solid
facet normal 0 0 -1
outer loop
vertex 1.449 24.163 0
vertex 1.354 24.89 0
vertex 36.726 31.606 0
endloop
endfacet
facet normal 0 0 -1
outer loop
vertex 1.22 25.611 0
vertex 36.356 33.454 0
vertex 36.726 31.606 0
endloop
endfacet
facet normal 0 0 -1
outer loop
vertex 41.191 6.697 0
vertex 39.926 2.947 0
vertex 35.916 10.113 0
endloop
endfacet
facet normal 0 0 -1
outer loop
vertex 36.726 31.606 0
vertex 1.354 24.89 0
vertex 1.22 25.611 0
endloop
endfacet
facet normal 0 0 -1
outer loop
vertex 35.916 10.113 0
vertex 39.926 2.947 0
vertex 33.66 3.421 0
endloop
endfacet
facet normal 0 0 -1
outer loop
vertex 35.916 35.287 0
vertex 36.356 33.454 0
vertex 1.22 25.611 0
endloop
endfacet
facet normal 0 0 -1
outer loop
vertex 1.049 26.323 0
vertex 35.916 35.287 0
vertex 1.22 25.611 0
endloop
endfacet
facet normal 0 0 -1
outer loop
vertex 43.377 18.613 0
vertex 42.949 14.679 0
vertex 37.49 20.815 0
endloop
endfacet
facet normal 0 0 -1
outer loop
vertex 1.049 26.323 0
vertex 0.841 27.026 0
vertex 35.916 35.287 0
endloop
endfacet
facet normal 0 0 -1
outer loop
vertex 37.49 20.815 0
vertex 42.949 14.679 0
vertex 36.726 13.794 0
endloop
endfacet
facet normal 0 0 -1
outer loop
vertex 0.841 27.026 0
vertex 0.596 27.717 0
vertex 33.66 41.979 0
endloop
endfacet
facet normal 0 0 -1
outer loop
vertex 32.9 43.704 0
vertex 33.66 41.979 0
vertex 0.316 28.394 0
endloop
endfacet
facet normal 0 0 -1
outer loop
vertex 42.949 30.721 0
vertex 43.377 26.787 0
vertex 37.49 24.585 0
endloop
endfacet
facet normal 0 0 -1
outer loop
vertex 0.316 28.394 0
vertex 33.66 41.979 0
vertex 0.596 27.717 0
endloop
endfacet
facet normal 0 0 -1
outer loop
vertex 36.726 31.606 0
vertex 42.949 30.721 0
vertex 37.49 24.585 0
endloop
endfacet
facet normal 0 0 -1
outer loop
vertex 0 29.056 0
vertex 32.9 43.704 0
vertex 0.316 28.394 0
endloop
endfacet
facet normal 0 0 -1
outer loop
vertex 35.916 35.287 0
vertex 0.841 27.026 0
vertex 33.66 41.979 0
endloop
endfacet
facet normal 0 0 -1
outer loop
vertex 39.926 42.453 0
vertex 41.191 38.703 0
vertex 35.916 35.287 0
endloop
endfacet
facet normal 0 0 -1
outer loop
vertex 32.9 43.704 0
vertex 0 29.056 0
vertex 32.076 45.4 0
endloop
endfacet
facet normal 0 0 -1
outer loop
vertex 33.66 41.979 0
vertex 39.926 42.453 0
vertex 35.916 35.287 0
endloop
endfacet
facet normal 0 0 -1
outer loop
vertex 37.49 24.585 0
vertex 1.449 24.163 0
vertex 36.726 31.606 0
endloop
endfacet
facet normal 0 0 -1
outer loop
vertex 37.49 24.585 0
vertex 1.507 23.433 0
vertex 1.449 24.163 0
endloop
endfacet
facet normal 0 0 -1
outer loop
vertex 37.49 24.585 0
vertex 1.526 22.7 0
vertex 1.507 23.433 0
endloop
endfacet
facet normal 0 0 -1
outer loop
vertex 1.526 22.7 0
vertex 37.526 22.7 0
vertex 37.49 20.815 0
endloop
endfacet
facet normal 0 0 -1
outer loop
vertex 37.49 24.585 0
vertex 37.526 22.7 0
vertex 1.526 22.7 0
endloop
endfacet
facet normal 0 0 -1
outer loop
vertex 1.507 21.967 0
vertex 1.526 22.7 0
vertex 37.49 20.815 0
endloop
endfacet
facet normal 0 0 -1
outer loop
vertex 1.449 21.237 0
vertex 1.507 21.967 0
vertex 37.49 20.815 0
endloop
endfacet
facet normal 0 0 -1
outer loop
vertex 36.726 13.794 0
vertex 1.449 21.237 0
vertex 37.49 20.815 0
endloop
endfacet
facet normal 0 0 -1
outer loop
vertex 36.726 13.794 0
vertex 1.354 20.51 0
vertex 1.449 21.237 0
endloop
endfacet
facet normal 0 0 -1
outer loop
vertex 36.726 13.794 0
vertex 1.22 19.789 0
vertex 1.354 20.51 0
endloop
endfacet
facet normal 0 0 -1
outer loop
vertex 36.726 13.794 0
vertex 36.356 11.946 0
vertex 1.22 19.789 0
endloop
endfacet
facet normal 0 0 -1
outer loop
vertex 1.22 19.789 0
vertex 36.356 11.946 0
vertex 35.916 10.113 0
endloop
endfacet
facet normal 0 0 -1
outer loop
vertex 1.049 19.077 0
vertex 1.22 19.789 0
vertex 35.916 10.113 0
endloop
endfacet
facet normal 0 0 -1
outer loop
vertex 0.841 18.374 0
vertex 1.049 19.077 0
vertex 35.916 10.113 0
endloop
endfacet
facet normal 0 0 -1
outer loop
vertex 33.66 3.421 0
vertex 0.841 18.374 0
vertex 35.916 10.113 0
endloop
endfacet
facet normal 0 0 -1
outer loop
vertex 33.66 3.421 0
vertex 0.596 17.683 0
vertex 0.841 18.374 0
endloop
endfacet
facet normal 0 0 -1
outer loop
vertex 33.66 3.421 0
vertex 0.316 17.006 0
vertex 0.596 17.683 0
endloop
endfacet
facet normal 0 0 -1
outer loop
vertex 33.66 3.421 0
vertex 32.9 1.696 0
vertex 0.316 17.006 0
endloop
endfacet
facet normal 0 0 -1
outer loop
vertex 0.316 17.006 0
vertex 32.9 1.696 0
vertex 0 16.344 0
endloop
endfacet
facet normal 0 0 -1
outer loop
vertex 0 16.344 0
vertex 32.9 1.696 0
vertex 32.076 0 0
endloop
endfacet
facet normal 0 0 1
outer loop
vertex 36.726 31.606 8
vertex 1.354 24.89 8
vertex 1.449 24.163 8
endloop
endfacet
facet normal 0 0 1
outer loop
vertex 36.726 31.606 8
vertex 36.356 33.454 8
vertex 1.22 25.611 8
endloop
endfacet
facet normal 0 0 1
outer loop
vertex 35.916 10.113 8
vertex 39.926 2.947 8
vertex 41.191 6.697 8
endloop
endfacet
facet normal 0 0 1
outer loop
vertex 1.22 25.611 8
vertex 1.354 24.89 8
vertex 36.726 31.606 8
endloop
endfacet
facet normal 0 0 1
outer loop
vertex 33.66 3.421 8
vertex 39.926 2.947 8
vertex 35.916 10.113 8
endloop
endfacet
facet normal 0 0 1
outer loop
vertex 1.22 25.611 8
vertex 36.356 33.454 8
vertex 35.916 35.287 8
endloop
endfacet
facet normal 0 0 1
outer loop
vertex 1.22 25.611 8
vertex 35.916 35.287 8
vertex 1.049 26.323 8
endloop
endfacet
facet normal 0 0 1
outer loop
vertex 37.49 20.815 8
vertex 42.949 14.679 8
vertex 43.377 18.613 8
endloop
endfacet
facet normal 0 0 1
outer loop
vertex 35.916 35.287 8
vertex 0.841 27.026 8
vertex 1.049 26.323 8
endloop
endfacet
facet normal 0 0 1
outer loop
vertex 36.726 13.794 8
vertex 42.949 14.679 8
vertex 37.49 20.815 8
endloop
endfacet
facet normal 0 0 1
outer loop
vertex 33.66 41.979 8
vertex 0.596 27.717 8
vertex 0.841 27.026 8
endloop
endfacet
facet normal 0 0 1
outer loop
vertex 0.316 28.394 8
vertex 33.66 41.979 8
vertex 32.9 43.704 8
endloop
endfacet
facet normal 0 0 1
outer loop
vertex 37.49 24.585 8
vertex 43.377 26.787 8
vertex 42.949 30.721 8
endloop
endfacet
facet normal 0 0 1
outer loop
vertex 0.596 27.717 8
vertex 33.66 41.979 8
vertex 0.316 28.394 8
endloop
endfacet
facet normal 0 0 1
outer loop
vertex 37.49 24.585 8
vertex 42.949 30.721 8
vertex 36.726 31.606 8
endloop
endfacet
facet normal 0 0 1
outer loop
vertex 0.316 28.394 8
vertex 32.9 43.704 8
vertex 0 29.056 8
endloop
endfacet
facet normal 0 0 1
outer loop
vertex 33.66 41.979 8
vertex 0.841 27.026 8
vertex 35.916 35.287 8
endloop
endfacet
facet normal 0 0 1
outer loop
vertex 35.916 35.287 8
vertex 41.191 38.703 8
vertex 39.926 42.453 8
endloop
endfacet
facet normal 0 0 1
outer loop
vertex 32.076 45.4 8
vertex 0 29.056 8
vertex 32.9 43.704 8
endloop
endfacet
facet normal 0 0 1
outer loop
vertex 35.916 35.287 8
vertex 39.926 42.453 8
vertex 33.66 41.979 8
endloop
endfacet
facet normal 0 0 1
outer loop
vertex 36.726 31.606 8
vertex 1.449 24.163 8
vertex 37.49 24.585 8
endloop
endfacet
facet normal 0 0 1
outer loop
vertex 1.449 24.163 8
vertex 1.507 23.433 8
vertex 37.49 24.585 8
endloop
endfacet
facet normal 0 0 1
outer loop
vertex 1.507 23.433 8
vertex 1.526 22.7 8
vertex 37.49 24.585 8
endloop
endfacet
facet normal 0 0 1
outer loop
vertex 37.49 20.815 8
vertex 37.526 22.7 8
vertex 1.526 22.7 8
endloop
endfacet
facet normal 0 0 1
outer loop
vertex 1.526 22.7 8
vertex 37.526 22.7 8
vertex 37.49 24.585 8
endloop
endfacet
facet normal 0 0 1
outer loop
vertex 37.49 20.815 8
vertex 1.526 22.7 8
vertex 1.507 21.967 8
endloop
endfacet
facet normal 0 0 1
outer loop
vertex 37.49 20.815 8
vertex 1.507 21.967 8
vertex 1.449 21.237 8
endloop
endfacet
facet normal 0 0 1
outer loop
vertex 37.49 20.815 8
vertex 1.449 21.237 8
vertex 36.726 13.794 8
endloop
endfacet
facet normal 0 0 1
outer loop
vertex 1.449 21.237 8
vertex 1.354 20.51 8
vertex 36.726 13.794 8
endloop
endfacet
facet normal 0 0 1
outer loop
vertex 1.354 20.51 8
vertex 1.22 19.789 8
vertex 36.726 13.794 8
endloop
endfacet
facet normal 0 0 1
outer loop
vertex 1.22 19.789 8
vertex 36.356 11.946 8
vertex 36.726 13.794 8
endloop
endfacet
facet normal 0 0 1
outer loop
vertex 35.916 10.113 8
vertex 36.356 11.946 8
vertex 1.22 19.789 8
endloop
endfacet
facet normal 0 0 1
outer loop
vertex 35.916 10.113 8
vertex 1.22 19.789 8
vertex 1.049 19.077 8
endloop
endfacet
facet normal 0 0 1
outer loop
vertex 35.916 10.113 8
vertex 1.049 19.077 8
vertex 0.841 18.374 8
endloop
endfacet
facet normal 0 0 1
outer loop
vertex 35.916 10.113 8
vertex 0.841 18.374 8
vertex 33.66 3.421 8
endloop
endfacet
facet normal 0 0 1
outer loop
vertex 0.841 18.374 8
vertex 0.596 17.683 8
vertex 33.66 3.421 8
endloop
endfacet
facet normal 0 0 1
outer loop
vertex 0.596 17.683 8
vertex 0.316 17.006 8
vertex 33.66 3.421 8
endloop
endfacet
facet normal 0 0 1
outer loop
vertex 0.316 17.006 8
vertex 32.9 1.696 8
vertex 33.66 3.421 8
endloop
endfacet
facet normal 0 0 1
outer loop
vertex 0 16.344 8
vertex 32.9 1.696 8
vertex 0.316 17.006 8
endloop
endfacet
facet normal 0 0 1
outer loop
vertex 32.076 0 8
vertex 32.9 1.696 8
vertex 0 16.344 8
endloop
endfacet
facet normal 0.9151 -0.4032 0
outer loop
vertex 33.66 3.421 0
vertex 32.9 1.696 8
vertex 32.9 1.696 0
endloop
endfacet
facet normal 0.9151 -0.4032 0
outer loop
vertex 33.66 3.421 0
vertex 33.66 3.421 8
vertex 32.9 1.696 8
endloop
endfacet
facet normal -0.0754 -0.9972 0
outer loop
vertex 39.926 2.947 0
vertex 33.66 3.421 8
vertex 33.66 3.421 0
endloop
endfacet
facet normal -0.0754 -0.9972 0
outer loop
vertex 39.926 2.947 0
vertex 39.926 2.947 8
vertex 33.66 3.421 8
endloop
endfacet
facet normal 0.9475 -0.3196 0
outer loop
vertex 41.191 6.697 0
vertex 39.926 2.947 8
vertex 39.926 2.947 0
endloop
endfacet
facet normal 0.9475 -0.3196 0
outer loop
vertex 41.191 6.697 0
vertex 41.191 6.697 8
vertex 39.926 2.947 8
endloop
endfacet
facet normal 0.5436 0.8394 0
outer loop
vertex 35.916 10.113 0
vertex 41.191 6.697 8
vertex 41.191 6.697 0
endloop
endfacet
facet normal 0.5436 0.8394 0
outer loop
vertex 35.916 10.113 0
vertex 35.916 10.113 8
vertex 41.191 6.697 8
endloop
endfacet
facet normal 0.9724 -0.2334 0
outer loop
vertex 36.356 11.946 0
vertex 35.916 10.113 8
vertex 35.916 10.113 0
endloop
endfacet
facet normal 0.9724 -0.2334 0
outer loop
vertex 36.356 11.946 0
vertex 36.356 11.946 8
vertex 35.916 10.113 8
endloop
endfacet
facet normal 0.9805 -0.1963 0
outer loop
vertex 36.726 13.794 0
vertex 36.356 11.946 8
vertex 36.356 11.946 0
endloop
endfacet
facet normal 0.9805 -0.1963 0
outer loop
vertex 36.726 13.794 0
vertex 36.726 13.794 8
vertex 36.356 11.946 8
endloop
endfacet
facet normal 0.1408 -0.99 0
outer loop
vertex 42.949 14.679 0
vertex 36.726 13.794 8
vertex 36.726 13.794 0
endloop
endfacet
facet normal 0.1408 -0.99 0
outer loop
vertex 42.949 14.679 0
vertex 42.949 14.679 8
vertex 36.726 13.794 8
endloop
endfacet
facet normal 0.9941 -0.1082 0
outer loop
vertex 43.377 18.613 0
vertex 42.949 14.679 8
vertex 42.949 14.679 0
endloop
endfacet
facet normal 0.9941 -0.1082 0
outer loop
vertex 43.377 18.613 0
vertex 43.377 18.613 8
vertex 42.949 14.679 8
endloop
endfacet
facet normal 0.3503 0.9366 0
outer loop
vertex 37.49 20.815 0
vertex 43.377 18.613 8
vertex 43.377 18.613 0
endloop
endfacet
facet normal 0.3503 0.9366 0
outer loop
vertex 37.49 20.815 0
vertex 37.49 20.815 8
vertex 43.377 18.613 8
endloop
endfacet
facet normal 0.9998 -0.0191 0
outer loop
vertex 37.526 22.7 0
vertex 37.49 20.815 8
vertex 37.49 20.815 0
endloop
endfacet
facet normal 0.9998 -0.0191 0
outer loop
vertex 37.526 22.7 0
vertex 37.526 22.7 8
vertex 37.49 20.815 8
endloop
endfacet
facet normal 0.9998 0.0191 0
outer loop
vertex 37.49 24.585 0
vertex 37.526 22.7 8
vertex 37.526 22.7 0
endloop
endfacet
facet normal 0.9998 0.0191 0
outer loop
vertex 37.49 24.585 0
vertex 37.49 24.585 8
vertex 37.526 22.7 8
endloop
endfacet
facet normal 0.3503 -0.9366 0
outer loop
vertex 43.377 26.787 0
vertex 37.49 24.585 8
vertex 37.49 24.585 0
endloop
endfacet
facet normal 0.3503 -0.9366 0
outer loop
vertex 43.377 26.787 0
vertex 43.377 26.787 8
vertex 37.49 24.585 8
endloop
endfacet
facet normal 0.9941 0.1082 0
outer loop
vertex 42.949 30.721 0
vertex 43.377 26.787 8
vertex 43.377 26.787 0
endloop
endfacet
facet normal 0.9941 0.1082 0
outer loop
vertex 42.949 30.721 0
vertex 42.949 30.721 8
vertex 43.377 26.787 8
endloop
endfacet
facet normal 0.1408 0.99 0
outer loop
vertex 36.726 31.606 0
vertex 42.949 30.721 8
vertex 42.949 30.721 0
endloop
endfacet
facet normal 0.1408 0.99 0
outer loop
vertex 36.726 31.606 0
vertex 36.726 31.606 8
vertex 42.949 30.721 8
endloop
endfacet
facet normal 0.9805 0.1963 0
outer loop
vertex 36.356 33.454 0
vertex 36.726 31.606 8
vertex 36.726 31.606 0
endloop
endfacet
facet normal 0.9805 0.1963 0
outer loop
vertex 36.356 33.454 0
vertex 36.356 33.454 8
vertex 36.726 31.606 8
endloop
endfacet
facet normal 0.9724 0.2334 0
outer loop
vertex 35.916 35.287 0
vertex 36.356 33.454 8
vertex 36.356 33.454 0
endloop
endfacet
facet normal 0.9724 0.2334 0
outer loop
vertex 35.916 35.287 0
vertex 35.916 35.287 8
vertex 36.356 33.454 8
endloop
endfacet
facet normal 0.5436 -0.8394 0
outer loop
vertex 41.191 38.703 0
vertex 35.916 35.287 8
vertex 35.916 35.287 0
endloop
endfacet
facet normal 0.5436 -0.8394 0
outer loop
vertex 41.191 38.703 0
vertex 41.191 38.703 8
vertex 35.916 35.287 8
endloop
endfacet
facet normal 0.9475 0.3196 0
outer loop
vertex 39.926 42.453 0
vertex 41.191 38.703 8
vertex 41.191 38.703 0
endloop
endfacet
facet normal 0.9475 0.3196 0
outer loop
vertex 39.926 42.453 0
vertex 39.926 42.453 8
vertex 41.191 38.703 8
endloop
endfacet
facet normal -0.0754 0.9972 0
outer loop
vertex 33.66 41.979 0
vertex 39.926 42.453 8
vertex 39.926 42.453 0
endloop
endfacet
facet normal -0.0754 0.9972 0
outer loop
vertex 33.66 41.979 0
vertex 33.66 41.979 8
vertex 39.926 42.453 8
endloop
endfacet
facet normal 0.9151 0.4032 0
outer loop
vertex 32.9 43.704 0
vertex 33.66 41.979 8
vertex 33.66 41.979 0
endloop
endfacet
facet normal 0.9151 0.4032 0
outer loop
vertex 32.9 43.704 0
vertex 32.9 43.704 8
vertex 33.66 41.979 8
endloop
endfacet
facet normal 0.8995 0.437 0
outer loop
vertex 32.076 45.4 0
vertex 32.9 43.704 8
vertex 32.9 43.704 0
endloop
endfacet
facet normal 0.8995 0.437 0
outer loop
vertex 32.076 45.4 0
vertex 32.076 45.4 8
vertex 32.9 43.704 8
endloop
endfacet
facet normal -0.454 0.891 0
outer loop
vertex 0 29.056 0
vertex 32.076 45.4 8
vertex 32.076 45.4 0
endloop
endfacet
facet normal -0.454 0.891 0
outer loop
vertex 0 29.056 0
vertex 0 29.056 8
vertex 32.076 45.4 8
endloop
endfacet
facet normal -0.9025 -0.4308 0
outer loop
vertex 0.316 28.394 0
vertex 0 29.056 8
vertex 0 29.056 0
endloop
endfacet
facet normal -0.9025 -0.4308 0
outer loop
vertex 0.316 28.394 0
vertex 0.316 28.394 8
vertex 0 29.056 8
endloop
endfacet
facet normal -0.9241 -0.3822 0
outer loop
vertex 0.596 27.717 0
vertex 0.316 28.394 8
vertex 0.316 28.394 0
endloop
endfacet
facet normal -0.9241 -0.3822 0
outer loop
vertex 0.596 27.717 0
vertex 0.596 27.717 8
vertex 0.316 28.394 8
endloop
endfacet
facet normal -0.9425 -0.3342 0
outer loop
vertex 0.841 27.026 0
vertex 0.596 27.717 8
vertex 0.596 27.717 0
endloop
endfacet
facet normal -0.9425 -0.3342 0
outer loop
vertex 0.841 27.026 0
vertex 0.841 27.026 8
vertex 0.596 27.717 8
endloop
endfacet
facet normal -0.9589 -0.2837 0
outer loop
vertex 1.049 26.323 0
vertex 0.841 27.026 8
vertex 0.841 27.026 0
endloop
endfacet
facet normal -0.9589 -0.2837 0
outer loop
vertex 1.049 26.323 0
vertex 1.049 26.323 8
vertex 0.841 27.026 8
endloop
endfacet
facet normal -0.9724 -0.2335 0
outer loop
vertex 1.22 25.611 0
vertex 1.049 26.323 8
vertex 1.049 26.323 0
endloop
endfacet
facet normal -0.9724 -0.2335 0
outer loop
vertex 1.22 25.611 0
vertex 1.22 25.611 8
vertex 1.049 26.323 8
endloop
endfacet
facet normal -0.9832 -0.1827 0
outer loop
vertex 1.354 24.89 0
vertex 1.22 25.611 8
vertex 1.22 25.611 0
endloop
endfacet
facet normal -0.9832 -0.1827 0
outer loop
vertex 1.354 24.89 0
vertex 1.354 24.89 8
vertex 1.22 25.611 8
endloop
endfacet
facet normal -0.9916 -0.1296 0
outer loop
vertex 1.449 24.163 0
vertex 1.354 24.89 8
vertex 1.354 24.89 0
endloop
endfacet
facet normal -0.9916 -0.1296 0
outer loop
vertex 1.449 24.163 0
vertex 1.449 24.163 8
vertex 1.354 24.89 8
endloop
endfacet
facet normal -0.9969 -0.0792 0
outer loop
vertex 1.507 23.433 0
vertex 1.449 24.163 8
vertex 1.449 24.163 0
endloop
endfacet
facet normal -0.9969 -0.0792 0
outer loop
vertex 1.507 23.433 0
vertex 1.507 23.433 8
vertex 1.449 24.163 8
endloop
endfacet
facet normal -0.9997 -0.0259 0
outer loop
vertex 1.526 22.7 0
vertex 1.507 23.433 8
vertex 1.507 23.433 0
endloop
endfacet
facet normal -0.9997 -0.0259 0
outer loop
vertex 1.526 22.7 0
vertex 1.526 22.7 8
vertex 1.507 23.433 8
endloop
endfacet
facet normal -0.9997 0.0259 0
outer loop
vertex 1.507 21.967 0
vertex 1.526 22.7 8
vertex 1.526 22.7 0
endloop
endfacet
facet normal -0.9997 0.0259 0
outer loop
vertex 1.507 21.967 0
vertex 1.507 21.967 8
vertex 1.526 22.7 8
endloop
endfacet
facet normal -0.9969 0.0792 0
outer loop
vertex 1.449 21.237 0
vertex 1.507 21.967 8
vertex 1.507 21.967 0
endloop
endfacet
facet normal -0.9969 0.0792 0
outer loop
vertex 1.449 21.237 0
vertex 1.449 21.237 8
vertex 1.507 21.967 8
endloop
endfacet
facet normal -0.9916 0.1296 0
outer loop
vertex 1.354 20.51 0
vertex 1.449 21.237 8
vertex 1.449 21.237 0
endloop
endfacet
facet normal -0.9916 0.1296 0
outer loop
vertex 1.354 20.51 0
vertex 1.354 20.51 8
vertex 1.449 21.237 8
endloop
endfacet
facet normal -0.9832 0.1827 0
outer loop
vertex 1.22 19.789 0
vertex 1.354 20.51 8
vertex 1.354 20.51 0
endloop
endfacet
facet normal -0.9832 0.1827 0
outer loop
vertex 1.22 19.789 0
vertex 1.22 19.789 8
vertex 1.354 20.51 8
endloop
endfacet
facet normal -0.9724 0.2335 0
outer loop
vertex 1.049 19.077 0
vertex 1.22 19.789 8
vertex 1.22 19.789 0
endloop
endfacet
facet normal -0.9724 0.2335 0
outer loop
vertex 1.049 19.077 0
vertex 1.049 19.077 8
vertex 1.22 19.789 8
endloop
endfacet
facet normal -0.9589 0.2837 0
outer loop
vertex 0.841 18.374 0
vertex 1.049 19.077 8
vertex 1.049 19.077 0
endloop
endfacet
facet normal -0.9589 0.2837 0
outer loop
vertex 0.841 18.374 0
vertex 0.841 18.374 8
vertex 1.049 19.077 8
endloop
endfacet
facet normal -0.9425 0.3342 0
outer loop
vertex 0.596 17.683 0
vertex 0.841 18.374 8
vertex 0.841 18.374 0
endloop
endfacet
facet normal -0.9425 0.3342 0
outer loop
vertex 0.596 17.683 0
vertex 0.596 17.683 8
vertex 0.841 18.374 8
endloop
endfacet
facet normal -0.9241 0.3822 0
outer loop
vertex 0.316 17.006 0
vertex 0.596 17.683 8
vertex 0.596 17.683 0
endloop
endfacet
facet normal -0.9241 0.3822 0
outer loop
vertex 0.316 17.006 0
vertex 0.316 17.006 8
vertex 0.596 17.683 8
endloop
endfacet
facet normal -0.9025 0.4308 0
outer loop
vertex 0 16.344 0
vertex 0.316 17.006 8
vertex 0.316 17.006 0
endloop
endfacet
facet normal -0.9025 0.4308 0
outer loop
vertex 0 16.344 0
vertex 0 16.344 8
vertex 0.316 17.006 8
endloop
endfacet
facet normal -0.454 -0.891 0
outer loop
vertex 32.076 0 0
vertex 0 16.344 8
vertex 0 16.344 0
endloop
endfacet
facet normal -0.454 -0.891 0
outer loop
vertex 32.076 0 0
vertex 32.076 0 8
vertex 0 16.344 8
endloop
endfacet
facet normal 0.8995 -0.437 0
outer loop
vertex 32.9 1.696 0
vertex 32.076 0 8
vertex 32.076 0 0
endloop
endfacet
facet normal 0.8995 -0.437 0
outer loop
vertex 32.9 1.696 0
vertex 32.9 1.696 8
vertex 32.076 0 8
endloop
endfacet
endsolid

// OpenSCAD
$fn = 32;

// ----------------------------------------------------------------------
// Gear sector: 4 teeth on 54 degrees
// ----------------------------------------------------------------------

// --- parameters (mm) ---
sector_angle = 54;        // sector angle, degrees
root_r = 50;              // root circle radius
tooth_h = 6;              // tooth height over the root circle
teeth = 4;                // number of teeth on the sector
hub_r = 14;               // hub bore radius
plate_t = 8;              // sector thickness, Z
arc_step = 3;             // sampling step of the root/hub arcs, degrees

tip_r = root_r + tooth_h;  // tip circle radius

profile = [[32.076, 0], [32.9, 1.696], [33.66, 3.421], [39.926, 2.947], [41.191, 6.697], [35.916, 10.113], [36.356, 11.946], [36.726, 13.794], [42.949, 14.679], [43.377, 18.613], [37.49, 20.815], [37.526, 22.7], [37.49, 24.585], [43.377, 26.787], [42.949, 30.721], [36.726, 31.606], [36.356, 33.454], [35.916, 35.287], [41.191, 38.703], [39.926, 42.453], [33.66, 41.979], [32.9, 43.704], [32.076, 45.4], [0, 29.056], [0.316, 28.394], [0.596, 27.717], [0.841, 27.026], [1.049, 26.323], [1.22, 25.611], [1.354, 24.89], [1.449, 24.163], [1.507, 23.433], [1.526, 22.7], [1.507, 21.967], [1.449, 21.237], [1.354, 20.51], [1.22, 19.789], [1.049, 19.077], [0.841, 18.374], [0.596, 17.683], [0.316, 17.006], [0, 16.344]];  // primary outline, 42 points, counter clockwise

// --- the one profile operation ---
linear_extrude(height = plate_t) polygon(points = profile);
